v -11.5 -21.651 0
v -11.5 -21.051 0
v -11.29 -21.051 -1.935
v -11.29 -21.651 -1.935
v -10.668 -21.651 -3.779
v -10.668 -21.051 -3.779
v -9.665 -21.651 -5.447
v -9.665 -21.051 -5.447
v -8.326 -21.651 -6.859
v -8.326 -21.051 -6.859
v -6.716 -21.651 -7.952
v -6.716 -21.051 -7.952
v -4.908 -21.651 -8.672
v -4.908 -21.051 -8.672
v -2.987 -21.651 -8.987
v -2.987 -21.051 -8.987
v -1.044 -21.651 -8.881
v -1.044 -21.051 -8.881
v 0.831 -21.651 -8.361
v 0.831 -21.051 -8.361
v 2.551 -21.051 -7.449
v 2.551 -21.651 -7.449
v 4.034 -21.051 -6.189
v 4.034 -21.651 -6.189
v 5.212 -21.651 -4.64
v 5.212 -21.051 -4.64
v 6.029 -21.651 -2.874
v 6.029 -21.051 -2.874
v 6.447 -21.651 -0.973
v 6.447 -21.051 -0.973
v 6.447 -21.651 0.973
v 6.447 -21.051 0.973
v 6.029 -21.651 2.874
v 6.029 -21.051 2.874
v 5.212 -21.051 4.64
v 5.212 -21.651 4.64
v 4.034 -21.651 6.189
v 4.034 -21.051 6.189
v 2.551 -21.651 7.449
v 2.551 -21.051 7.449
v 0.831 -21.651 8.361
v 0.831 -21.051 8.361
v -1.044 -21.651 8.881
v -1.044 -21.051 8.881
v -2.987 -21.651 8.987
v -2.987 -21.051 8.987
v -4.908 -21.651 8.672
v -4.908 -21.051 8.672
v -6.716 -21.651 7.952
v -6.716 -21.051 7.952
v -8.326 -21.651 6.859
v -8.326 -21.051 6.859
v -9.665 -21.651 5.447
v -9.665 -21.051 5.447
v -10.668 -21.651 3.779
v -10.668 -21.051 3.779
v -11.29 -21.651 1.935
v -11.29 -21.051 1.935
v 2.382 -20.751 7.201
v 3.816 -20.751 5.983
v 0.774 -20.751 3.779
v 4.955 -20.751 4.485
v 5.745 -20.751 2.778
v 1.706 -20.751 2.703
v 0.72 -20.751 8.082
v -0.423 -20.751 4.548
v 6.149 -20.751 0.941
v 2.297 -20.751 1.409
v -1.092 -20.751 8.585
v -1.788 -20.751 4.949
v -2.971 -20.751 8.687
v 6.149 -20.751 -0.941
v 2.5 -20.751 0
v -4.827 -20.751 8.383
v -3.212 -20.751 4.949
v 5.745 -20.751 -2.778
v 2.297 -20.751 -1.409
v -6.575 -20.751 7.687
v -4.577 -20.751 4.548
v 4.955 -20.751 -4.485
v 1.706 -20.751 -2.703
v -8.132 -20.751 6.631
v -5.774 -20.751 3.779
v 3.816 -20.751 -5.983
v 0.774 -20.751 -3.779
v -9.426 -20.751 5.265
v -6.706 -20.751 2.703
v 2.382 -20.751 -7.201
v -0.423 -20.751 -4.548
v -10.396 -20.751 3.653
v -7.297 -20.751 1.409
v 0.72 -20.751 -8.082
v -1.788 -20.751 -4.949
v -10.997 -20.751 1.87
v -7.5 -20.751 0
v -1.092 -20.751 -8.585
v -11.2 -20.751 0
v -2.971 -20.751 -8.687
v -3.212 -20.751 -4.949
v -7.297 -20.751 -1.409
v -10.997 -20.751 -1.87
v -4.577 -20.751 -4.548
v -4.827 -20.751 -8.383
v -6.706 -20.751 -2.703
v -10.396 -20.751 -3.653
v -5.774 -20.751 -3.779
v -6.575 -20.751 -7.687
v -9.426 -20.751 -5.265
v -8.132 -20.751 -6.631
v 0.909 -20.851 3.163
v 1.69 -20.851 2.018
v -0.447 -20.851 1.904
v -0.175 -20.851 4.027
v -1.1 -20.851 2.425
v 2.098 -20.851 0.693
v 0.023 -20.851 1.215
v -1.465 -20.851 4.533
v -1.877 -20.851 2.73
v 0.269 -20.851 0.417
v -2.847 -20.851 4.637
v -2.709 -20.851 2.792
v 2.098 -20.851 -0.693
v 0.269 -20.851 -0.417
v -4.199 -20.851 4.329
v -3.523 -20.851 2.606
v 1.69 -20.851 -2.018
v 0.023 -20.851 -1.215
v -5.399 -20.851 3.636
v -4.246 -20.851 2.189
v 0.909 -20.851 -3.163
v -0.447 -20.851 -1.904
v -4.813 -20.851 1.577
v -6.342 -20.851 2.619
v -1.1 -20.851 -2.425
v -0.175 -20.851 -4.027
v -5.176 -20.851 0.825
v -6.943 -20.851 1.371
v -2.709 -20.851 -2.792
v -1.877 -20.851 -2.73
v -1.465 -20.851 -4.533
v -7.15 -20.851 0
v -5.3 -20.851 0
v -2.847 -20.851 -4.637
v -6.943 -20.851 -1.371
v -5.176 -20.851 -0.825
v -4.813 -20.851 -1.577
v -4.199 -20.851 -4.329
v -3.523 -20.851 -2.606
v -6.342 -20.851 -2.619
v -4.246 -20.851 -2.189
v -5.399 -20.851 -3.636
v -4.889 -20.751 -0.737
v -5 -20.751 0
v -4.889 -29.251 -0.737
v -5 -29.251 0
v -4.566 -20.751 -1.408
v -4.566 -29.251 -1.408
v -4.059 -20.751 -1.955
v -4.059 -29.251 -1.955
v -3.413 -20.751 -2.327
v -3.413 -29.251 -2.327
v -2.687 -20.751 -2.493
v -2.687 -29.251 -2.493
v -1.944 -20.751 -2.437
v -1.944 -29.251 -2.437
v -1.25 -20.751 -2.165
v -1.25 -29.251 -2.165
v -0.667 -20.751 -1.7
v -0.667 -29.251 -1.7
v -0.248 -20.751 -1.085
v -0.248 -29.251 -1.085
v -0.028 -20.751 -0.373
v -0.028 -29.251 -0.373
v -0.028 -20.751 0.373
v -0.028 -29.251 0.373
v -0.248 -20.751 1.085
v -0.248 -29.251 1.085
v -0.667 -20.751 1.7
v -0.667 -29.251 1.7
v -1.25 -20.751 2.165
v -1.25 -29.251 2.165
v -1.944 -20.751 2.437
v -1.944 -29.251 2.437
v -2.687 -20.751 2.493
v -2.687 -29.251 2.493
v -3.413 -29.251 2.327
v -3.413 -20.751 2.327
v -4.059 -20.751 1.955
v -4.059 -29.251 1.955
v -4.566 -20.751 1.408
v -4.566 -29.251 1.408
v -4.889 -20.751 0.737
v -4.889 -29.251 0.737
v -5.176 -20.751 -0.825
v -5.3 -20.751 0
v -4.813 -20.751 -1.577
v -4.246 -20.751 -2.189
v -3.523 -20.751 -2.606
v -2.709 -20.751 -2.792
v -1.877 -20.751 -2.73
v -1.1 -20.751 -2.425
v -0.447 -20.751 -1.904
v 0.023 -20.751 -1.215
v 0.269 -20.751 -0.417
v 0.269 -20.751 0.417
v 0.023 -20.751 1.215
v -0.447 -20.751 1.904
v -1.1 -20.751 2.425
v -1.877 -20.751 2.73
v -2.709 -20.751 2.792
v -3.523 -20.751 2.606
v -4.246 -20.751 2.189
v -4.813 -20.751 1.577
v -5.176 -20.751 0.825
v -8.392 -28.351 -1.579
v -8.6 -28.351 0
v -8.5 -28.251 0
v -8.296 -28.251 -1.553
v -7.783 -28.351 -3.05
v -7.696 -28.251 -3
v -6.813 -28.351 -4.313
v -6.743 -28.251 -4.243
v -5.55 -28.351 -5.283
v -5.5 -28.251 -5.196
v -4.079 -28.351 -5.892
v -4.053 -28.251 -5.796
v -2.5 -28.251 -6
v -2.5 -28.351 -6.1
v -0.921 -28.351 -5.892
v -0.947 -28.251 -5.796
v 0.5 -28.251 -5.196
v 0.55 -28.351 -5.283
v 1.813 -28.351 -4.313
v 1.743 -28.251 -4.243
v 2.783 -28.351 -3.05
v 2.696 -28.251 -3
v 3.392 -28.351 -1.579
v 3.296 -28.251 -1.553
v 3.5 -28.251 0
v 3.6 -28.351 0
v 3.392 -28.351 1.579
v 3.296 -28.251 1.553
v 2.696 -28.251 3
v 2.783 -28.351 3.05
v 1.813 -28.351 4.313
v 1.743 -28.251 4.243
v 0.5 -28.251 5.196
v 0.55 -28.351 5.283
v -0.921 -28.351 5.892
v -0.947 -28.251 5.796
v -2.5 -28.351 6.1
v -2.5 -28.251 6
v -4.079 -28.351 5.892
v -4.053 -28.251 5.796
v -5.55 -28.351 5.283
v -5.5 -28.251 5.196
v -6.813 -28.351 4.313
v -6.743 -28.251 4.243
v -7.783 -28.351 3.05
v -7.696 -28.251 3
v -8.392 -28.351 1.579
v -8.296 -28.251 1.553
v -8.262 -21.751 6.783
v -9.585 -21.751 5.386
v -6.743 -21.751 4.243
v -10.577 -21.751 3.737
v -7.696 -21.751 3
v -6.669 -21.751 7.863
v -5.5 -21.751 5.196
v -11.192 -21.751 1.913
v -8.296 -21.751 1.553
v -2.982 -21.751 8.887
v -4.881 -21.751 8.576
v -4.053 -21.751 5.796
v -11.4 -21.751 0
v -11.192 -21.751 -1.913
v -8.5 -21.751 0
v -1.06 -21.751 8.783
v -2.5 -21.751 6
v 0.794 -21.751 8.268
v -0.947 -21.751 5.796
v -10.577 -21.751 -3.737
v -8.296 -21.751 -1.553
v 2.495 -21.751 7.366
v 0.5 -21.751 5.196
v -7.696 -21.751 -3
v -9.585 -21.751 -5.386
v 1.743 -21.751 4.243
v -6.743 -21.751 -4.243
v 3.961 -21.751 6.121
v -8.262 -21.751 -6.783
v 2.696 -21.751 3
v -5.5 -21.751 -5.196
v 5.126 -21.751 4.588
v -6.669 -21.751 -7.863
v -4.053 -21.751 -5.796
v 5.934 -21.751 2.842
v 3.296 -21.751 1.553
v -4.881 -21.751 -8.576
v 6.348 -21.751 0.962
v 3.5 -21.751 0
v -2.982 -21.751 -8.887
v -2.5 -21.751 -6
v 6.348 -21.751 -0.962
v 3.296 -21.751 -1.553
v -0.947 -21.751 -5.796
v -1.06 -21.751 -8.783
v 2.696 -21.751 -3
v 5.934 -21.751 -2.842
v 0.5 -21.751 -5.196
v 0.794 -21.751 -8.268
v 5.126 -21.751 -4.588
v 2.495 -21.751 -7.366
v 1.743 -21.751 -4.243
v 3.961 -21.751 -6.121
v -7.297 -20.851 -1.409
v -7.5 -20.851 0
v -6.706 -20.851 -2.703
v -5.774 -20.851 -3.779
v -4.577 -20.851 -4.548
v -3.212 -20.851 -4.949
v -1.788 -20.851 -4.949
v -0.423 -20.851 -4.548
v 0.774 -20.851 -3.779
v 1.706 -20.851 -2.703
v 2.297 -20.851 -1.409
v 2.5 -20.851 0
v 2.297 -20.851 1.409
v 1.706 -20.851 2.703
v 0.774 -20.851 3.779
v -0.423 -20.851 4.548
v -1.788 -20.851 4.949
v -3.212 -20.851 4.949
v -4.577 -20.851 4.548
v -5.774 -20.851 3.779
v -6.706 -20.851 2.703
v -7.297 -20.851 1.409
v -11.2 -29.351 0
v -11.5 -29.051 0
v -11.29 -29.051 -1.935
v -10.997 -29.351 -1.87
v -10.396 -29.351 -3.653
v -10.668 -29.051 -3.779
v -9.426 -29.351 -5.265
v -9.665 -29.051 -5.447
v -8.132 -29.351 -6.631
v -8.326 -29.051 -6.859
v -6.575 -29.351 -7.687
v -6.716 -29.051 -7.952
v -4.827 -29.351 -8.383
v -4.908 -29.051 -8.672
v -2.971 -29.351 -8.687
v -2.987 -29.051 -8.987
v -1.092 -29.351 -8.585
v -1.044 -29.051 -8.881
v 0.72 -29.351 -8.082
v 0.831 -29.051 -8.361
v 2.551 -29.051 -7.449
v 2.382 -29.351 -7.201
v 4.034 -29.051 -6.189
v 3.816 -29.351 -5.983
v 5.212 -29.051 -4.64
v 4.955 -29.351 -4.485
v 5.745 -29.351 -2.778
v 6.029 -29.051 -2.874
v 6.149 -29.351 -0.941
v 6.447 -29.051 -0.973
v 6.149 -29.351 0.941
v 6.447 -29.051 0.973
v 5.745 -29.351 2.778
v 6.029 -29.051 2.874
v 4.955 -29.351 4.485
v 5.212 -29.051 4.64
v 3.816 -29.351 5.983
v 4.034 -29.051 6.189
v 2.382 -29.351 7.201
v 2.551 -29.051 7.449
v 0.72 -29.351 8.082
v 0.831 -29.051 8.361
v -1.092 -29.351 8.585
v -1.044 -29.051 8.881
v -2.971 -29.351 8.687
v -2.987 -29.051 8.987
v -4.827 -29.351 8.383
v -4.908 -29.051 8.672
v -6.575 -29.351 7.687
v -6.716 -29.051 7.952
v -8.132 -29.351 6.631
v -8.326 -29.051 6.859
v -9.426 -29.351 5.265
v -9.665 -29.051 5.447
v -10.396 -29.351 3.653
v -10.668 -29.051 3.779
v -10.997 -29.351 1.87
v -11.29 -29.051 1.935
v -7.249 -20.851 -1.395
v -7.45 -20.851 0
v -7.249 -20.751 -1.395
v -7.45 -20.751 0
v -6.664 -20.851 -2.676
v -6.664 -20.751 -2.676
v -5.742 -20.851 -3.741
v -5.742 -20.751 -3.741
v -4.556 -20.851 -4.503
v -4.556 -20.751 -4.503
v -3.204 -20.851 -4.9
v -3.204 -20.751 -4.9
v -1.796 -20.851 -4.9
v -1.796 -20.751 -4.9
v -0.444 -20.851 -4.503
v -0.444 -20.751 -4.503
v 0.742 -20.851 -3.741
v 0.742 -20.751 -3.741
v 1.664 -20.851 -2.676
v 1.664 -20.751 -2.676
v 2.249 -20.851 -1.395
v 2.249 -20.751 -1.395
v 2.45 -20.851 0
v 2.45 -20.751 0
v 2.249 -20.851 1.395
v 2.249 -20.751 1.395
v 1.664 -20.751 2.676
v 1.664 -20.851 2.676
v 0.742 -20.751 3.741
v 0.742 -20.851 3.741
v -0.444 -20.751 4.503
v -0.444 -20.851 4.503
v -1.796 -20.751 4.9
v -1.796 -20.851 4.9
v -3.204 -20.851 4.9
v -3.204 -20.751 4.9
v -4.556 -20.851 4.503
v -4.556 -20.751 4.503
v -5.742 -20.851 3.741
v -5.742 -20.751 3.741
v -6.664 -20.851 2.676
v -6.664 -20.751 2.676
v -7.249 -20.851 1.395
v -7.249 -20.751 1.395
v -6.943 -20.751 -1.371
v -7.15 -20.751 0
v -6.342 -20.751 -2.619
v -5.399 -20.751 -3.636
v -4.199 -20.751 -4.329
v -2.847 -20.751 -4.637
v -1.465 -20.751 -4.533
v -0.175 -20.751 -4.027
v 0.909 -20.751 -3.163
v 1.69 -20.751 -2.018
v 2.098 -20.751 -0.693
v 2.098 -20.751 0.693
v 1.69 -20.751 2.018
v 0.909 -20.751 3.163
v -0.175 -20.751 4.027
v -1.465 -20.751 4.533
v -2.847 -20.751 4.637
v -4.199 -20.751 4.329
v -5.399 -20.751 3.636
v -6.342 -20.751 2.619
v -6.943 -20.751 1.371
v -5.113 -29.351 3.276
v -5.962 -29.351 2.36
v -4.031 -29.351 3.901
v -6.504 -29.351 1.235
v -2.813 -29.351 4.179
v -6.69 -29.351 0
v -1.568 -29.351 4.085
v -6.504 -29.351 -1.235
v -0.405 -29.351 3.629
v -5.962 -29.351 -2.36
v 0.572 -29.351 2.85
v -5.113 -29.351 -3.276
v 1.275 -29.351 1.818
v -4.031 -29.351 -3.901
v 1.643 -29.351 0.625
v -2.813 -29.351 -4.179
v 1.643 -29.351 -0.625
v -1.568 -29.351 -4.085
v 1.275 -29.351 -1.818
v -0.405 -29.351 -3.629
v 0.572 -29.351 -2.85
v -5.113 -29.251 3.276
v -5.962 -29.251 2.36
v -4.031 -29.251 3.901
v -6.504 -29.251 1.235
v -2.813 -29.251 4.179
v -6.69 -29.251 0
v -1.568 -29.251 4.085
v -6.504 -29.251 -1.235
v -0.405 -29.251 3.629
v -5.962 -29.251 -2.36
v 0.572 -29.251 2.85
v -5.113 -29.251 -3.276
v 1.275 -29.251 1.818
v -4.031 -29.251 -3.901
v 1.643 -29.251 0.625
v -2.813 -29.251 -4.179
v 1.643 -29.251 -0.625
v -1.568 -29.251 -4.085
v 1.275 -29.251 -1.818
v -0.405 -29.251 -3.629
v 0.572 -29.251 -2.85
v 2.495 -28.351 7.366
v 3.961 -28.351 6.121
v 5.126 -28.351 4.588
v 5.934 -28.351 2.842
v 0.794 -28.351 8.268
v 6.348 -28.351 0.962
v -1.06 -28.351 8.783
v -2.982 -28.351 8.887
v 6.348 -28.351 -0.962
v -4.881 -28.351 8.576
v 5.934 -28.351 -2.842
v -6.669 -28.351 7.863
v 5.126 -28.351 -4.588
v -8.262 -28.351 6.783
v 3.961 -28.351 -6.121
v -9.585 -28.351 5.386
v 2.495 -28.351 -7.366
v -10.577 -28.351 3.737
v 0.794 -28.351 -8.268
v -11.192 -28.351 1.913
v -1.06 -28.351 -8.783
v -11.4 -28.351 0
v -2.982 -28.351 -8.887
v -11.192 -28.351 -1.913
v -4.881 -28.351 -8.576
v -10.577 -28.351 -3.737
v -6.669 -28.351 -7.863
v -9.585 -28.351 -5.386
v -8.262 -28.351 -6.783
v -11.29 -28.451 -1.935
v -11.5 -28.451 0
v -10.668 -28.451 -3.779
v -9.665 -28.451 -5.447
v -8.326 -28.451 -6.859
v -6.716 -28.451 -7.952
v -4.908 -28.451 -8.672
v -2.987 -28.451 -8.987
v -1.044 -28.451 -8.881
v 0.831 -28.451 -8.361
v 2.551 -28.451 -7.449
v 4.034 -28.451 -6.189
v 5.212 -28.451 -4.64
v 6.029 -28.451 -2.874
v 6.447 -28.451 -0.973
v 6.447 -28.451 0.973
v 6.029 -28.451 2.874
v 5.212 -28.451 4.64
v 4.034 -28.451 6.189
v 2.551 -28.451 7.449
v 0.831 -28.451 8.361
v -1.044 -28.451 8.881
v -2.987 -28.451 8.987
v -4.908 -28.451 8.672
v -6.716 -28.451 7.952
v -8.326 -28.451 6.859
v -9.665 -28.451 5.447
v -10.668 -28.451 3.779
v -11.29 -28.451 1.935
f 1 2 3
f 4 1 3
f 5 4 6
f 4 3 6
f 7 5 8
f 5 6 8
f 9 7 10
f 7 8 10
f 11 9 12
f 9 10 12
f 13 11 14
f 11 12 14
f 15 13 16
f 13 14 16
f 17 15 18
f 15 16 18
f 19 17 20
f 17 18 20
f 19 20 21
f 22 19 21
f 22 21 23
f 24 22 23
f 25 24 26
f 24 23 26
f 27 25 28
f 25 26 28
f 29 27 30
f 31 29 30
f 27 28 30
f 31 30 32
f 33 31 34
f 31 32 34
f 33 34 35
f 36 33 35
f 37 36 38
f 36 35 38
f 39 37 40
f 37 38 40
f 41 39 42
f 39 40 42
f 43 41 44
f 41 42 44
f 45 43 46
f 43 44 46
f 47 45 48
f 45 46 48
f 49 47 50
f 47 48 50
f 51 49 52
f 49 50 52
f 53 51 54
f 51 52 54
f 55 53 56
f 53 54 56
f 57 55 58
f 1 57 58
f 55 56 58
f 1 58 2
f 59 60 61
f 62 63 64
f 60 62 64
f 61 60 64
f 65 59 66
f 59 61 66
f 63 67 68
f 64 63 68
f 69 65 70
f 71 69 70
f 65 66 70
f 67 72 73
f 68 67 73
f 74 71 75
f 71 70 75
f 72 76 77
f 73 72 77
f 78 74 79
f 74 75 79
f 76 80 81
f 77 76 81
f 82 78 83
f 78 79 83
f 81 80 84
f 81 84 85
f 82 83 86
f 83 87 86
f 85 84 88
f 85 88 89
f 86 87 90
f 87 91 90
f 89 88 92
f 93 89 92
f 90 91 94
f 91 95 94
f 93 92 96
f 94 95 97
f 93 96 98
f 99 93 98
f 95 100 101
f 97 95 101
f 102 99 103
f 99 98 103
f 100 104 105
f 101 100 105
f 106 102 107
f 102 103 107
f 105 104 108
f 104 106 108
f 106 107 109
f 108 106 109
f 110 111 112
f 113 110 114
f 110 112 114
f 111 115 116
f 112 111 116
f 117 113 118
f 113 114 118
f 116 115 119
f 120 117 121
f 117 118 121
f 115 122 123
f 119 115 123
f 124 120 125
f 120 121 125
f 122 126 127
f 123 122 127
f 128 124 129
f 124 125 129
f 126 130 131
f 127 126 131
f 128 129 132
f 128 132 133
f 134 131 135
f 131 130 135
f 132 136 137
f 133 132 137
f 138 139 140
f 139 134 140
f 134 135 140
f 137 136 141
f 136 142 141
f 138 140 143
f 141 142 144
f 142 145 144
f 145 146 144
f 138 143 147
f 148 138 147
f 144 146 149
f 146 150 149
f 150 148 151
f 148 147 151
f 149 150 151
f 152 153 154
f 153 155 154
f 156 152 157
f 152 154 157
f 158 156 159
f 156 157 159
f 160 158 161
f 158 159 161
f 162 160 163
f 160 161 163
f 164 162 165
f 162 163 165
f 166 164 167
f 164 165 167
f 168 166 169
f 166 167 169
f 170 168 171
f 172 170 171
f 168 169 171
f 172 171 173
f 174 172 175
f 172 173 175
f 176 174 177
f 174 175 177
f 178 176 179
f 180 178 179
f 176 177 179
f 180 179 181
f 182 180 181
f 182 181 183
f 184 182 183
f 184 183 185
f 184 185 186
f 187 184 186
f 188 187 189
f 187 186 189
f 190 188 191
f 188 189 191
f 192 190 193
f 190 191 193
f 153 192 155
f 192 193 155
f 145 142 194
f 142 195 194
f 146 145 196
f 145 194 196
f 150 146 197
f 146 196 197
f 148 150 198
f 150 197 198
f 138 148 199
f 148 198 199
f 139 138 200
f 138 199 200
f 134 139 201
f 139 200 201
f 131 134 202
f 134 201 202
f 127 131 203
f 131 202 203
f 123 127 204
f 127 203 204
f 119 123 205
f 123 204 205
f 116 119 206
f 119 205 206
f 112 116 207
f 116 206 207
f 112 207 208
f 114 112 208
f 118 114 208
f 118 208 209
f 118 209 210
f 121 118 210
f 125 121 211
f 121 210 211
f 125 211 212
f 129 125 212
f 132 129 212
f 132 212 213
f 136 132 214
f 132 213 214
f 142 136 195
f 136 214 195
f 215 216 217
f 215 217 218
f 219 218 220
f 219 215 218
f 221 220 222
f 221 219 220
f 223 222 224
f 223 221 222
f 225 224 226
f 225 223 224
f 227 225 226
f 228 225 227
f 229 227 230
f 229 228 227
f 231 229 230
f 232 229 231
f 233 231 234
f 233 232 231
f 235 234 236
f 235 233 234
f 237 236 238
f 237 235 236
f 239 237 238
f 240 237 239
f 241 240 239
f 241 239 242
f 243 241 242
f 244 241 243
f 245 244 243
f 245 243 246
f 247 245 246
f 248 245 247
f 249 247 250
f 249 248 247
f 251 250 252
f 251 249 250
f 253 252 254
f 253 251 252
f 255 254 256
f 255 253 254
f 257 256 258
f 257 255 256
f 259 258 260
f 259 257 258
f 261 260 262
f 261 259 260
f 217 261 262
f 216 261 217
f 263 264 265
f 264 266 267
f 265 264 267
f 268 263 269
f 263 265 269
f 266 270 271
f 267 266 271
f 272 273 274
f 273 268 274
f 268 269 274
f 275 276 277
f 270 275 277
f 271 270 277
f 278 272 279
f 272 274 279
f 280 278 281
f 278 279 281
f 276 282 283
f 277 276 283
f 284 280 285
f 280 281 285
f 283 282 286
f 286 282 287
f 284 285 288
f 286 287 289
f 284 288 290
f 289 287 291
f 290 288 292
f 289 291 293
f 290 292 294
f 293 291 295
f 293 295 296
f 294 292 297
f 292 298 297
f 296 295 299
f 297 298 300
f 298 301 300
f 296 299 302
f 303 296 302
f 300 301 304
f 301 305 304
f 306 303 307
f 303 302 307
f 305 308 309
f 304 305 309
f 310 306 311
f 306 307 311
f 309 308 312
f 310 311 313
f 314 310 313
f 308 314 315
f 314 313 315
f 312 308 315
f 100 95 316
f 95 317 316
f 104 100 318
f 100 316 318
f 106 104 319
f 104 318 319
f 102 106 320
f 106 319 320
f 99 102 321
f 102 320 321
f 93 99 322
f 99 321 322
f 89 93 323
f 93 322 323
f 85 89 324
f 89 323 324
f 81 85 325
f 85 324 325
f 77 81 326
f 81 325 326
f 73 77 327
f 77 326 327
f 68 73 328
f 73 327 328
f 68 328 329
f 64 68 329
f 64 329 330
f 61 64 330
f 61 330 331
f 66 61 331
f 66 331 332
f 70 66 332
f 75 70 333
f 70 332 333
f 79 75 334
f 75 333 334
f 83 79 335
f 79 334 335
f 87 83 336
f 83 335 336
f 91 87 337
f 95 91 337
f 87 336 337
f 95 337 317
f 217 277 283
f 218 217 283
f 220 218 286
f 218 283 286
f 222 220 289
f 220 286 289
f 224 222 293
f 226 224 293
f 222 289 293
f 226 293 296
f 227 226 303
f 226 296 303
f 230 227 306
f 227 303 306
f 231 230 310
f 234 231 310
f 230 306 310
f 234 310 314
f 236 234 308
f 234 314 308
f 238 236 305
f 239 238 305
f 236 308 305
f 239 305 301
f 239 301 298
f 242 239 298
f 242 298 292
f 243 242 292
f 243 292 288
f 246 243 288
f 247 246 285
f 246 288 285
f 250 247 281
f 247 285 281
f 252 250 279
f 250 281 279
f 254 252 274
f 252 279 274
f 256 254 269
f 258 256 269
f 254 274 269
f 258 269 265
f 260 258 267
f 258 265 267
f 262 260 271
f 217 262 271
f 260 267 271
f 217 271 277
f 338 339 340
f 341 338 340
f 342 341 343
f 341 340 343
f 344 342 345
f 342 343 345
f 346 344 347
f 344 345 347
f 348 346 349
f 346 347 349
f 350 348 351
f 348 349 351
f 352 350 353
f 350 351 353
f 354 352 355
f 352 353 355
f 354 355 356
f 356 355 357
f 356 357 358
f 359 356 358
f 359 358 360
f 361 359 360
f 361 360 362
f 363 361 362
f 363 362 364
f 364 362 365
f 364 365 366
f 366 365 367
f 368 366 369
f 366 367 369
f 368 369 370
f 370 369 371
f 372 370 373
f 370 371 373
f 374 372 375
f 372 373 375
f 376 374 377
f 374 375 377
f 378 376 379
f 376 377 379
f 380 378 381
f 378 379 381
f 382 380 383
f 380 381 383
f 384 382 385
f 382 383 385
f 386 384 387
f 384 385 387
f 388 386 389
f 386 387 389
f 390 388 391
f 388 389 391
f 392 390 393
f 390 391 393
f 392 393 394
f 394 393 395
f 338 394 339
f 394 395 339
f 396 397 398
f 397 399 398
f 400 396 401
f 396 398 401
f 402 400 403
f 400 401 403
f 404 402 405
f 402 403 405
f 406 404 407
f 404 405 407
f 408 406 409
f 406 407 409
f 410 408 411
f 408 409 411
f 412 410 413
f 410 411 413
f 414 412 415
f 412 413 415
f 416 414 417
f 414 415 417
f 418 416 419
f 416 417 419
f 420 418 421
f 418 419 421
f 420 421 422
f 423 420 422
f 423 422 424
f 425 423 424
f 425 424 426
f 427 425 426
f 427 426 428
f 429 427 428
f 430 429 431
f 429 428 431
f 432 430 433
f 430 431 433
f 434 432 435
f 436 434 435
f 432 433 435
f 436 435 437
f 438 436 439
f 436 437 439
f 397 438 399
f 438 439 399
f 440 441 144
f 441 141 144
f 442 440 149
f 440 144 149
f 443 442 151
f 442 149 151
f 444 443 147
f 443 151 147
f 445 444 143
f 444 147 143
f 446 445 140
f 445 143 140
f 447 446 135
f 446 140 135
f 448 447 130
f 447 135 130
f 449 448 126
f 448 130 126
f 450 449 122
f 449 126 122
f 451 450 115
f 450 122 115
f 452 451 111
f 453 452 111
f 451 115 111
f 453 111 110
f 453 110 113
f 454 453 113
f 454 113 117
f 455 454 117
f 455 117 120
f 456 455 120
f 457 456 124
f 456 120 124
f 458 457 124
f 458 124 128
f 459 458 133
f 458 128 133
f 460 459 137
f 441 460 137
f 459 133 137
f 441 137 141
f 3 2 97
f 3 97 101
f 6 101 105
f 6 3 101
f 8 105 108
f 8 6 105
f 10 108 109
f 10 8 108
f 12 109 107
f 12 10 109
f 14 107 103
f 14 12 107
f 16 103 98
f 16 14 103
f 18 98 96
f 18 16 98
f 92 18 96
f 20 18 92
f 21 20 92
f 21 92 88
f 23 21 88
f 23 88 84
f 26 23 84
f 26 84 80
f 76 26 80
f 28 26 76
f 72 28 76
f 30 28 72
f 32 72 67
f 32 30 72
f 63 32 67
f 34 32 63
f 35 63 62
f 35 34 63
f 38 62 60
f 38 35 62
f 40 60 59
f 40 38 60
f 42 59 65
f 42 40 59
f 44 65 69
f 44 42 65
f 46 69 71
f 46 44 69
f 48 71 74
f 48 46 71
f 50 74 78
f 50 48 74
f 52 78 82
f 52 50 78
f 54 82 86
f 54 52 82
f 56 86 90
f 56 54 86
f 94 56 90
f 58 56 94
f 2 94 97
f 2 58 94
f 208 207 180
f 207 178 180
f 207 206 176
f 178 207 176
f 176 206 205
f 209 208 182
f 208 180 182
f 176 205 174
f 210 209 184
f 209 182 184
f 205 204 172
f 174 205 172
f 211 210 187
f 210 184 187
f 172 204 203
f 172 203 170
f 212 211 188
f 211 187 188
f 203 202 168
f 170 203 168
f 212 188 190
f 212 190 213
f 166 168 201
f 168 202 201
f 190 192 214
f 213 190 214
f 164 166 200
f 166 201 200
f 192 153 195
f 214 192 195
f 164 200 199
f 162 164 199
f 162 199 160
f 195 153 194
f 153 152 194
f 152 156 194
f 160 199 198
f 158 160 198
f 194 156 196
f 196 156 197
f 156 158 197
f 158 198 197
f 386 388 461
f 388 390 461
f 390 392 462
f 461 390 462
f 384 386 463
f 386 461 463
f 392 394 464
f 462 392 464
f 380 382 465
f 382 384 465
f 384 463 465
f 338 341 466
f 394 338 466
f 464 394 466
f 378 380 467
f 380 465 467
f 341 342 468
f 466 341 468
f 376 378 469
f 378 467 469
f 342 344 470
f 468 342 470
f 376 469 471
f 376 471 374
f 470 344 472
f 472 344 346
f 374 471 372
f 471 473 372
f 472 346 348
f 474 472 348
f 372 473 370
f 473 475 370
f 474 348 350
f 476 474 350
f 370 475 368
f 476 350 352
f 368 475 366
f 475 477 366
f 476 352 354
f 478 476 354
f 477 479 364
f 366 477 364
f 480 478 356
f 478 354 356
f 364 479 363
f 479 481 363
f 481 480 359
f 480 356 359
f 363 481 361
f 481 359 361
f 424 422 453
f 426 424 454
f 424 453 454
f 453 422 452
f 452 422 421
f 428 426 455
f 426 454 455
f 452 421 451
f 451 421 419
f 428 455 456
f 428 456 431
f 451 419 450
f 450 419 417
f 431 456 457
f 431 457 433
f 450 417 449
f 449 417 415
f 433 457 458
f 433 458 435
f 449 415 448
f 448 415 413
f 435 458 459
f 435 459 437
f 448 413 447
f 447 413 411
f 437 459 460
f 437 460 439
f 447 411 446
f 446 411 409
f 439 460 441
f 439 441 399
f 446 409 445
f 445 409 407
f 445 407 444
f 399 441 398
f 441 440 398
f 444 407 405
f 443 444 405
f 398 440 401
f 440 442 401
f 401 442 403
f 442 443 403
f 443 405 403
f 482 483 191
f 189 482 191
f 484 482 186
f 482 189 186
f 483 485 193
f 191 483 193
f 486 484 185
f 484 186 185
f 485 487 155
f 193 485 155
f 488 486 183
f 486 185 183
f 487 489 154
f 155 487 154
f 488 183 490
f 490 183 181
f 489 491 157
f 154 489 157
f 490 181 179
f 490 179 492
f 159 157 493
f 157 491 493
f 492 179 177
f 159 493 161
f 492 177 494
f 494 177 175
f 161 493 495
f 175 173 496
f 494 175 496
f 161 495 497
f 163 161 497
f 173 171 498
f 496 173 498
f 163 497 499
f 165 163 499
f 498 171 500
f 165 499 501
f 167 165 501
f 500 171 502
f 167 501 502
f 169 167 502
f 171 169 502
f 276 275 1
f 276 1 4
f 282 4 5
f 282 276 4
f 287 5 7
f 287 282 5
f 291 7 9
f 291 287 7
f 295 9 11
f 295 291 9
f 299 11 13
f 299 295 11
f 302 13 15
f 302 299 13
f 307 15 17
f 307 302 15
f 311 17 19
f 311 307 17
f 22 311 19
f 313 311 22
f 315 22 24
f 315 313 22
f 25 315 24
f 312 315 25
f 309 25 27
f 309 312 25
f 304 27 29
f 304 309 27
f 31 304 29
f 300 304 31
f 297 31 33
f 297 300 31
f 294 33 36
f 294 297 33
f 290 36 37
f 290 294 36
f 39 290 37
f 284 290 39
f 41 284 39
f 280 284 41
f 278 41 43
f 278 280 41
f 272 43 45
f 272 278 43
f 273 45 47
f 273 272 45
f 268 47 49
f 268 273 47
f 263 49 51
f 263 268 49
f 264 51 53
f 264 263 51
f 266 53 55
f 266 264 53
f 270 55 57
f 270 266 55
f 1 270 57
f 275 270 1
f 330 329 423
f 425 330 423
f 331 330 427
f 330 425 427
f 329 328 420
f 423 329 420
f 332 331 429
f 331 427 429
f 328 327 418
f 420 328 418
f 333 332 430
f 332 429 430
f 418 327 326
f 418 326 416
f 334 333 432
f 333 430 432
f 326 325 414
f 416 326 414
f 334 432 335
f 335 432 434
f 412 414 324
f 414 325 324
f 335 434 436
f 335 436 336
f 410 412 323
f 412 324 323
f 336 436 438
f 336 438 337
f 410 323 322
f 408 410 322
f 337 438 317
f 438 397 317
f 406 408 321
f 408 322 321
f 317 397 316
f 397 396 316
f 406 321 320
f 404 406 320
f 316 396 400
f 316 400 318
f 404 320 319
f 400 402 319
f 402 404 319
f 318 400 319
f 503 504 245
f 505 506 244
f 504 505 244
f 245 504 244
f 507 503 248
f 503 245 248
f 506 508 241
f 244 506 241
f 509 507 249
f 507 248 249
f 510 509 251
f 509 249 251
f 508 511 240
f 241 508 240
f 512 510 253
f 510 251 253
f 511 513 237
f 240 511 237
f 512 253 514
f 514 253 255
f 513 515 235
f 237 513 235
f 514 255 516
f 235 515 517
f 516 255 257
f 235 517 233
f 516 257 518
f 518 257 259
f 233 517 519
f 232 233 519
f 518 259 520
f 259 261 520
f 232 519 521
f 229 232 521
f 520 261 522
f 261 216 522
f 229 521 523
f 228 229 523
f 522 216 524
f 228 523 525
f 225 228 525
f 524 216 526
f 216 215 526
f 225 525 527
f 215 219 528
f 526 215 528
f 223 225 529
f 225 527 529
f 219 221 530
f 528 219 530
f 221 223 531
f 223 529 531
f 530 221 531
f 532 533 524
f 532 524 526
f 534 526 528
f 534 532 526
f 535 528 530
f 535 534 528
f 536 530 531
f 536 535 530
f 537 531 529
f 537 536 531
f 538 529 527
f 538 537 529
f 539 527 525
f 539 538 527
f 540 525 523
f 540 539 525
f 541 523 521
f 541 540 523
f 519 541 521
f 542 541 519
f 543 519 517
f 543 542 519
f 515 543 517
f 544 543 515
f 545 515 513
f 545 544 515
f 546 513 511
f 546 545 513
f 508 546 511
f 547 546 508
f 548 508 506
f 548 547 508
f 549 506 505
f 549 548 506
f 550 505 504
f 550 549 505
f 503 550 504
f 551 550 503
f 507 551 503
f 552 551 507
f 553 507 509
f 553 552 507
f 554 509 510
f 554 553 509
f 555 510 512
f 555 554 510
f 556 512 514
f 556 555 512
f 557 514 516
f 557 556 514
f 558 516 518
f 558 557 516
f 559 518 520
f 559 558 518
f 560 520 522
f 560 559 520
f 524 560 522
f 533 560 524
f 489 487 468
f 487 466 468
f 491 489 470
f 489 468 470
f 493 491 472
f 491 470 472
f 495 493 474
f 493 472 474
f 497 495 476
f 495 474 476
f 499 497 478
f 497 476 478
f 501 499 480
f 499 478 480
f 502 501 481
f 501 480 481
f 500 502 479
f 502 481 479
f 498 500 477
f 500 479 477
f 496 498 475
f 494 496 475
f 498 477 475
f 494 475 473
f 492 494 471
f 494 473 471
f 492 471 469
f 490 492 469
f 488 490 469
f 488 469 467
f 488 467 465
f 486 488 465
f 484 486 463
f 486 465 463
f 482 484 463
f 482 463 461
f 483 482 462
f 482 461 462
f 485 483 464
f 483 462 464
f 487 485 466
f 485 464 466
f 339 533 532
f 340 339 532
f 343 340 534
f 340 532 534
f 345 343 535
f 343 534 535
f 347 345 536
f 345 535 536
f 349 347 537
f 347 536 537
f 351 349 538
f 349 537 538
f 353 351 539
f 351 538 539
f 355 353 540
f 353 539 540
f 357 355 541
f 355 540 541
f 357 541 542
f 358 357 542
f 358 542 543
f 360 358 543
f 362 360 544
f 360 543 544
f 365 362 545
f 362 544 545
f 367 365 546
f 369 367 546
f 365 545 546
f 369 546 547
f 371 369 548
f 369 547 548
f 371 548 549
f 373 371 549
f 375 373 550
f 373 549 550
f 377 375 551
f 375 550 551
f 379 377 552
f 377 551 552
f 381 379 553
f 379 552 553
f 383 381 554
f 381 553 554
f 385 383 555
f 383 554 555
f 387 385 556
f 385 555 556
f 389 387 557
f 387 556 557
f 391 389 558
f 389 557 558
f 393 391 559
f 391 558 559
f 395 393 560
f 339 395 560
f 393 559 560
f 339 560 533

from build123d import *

# Parameters (mm, degrees)
CHAFL_N3_SIZE = 0.3
CHAFL_N4_SIZE = 0.1


with BuildPart() as part:
    # Croquis1 → Revolución3 (revolve)
    with BuildSketch(Plane.XY, mode=Mode.PRIVATE) as revoluci_n3_sk:
        Polygon((6.5, -20.750745615), (2.5, -20.750745615), (2.5, -20.850745615), (2.45, -20.850745615), (2.45, -20.750745615), (2.15, -20.750745615), (2.15, -20.850745615), (0.3, -20.850745615), (0.3, -20.750745615), (0, -20.750745615), (0, -20.850745615), (0, -29.250745615), (1.690218344, -29.250745615), (1.690218344, -29.350745615), (6.5, -29.350745615), (6.5, -28.350745615), (3.5, -28.350745615), (3.5, -21.750745615), (6.5, -21.750745615), align=None)
    revolve(revoluci_n3_sk.sketch.rotate(Axis((-2.5, -20.750745615, 0), (0, -1, 0)), 180), axis=Axis((-2.5, -20.750745615, 0), (0, -1, 0)))

    # Chaflán3
    chafl_n3_edges = [part.edges().sort_by_distance(p)[0] for p in [
        (6.5, -29.350745615, 0),
        (6.5, -20.750745615, 0),
    ]]
    chamfer(chafl_n3_edges, length=CHAFL_N3_SIZE)

    # Chaflán4
    chafl_n4_edges = [part.edges().sort_by_distance(p)[0] for p in [
        (6.5, -28.350745615, 0),
        (3.5, -28.350745615, 0),
        (6.5, -21.750745615, 0),
    ]]
    chamfer(chafl_n4_edges, length=CHAFL_N4_SIZE)


solid = part.part
